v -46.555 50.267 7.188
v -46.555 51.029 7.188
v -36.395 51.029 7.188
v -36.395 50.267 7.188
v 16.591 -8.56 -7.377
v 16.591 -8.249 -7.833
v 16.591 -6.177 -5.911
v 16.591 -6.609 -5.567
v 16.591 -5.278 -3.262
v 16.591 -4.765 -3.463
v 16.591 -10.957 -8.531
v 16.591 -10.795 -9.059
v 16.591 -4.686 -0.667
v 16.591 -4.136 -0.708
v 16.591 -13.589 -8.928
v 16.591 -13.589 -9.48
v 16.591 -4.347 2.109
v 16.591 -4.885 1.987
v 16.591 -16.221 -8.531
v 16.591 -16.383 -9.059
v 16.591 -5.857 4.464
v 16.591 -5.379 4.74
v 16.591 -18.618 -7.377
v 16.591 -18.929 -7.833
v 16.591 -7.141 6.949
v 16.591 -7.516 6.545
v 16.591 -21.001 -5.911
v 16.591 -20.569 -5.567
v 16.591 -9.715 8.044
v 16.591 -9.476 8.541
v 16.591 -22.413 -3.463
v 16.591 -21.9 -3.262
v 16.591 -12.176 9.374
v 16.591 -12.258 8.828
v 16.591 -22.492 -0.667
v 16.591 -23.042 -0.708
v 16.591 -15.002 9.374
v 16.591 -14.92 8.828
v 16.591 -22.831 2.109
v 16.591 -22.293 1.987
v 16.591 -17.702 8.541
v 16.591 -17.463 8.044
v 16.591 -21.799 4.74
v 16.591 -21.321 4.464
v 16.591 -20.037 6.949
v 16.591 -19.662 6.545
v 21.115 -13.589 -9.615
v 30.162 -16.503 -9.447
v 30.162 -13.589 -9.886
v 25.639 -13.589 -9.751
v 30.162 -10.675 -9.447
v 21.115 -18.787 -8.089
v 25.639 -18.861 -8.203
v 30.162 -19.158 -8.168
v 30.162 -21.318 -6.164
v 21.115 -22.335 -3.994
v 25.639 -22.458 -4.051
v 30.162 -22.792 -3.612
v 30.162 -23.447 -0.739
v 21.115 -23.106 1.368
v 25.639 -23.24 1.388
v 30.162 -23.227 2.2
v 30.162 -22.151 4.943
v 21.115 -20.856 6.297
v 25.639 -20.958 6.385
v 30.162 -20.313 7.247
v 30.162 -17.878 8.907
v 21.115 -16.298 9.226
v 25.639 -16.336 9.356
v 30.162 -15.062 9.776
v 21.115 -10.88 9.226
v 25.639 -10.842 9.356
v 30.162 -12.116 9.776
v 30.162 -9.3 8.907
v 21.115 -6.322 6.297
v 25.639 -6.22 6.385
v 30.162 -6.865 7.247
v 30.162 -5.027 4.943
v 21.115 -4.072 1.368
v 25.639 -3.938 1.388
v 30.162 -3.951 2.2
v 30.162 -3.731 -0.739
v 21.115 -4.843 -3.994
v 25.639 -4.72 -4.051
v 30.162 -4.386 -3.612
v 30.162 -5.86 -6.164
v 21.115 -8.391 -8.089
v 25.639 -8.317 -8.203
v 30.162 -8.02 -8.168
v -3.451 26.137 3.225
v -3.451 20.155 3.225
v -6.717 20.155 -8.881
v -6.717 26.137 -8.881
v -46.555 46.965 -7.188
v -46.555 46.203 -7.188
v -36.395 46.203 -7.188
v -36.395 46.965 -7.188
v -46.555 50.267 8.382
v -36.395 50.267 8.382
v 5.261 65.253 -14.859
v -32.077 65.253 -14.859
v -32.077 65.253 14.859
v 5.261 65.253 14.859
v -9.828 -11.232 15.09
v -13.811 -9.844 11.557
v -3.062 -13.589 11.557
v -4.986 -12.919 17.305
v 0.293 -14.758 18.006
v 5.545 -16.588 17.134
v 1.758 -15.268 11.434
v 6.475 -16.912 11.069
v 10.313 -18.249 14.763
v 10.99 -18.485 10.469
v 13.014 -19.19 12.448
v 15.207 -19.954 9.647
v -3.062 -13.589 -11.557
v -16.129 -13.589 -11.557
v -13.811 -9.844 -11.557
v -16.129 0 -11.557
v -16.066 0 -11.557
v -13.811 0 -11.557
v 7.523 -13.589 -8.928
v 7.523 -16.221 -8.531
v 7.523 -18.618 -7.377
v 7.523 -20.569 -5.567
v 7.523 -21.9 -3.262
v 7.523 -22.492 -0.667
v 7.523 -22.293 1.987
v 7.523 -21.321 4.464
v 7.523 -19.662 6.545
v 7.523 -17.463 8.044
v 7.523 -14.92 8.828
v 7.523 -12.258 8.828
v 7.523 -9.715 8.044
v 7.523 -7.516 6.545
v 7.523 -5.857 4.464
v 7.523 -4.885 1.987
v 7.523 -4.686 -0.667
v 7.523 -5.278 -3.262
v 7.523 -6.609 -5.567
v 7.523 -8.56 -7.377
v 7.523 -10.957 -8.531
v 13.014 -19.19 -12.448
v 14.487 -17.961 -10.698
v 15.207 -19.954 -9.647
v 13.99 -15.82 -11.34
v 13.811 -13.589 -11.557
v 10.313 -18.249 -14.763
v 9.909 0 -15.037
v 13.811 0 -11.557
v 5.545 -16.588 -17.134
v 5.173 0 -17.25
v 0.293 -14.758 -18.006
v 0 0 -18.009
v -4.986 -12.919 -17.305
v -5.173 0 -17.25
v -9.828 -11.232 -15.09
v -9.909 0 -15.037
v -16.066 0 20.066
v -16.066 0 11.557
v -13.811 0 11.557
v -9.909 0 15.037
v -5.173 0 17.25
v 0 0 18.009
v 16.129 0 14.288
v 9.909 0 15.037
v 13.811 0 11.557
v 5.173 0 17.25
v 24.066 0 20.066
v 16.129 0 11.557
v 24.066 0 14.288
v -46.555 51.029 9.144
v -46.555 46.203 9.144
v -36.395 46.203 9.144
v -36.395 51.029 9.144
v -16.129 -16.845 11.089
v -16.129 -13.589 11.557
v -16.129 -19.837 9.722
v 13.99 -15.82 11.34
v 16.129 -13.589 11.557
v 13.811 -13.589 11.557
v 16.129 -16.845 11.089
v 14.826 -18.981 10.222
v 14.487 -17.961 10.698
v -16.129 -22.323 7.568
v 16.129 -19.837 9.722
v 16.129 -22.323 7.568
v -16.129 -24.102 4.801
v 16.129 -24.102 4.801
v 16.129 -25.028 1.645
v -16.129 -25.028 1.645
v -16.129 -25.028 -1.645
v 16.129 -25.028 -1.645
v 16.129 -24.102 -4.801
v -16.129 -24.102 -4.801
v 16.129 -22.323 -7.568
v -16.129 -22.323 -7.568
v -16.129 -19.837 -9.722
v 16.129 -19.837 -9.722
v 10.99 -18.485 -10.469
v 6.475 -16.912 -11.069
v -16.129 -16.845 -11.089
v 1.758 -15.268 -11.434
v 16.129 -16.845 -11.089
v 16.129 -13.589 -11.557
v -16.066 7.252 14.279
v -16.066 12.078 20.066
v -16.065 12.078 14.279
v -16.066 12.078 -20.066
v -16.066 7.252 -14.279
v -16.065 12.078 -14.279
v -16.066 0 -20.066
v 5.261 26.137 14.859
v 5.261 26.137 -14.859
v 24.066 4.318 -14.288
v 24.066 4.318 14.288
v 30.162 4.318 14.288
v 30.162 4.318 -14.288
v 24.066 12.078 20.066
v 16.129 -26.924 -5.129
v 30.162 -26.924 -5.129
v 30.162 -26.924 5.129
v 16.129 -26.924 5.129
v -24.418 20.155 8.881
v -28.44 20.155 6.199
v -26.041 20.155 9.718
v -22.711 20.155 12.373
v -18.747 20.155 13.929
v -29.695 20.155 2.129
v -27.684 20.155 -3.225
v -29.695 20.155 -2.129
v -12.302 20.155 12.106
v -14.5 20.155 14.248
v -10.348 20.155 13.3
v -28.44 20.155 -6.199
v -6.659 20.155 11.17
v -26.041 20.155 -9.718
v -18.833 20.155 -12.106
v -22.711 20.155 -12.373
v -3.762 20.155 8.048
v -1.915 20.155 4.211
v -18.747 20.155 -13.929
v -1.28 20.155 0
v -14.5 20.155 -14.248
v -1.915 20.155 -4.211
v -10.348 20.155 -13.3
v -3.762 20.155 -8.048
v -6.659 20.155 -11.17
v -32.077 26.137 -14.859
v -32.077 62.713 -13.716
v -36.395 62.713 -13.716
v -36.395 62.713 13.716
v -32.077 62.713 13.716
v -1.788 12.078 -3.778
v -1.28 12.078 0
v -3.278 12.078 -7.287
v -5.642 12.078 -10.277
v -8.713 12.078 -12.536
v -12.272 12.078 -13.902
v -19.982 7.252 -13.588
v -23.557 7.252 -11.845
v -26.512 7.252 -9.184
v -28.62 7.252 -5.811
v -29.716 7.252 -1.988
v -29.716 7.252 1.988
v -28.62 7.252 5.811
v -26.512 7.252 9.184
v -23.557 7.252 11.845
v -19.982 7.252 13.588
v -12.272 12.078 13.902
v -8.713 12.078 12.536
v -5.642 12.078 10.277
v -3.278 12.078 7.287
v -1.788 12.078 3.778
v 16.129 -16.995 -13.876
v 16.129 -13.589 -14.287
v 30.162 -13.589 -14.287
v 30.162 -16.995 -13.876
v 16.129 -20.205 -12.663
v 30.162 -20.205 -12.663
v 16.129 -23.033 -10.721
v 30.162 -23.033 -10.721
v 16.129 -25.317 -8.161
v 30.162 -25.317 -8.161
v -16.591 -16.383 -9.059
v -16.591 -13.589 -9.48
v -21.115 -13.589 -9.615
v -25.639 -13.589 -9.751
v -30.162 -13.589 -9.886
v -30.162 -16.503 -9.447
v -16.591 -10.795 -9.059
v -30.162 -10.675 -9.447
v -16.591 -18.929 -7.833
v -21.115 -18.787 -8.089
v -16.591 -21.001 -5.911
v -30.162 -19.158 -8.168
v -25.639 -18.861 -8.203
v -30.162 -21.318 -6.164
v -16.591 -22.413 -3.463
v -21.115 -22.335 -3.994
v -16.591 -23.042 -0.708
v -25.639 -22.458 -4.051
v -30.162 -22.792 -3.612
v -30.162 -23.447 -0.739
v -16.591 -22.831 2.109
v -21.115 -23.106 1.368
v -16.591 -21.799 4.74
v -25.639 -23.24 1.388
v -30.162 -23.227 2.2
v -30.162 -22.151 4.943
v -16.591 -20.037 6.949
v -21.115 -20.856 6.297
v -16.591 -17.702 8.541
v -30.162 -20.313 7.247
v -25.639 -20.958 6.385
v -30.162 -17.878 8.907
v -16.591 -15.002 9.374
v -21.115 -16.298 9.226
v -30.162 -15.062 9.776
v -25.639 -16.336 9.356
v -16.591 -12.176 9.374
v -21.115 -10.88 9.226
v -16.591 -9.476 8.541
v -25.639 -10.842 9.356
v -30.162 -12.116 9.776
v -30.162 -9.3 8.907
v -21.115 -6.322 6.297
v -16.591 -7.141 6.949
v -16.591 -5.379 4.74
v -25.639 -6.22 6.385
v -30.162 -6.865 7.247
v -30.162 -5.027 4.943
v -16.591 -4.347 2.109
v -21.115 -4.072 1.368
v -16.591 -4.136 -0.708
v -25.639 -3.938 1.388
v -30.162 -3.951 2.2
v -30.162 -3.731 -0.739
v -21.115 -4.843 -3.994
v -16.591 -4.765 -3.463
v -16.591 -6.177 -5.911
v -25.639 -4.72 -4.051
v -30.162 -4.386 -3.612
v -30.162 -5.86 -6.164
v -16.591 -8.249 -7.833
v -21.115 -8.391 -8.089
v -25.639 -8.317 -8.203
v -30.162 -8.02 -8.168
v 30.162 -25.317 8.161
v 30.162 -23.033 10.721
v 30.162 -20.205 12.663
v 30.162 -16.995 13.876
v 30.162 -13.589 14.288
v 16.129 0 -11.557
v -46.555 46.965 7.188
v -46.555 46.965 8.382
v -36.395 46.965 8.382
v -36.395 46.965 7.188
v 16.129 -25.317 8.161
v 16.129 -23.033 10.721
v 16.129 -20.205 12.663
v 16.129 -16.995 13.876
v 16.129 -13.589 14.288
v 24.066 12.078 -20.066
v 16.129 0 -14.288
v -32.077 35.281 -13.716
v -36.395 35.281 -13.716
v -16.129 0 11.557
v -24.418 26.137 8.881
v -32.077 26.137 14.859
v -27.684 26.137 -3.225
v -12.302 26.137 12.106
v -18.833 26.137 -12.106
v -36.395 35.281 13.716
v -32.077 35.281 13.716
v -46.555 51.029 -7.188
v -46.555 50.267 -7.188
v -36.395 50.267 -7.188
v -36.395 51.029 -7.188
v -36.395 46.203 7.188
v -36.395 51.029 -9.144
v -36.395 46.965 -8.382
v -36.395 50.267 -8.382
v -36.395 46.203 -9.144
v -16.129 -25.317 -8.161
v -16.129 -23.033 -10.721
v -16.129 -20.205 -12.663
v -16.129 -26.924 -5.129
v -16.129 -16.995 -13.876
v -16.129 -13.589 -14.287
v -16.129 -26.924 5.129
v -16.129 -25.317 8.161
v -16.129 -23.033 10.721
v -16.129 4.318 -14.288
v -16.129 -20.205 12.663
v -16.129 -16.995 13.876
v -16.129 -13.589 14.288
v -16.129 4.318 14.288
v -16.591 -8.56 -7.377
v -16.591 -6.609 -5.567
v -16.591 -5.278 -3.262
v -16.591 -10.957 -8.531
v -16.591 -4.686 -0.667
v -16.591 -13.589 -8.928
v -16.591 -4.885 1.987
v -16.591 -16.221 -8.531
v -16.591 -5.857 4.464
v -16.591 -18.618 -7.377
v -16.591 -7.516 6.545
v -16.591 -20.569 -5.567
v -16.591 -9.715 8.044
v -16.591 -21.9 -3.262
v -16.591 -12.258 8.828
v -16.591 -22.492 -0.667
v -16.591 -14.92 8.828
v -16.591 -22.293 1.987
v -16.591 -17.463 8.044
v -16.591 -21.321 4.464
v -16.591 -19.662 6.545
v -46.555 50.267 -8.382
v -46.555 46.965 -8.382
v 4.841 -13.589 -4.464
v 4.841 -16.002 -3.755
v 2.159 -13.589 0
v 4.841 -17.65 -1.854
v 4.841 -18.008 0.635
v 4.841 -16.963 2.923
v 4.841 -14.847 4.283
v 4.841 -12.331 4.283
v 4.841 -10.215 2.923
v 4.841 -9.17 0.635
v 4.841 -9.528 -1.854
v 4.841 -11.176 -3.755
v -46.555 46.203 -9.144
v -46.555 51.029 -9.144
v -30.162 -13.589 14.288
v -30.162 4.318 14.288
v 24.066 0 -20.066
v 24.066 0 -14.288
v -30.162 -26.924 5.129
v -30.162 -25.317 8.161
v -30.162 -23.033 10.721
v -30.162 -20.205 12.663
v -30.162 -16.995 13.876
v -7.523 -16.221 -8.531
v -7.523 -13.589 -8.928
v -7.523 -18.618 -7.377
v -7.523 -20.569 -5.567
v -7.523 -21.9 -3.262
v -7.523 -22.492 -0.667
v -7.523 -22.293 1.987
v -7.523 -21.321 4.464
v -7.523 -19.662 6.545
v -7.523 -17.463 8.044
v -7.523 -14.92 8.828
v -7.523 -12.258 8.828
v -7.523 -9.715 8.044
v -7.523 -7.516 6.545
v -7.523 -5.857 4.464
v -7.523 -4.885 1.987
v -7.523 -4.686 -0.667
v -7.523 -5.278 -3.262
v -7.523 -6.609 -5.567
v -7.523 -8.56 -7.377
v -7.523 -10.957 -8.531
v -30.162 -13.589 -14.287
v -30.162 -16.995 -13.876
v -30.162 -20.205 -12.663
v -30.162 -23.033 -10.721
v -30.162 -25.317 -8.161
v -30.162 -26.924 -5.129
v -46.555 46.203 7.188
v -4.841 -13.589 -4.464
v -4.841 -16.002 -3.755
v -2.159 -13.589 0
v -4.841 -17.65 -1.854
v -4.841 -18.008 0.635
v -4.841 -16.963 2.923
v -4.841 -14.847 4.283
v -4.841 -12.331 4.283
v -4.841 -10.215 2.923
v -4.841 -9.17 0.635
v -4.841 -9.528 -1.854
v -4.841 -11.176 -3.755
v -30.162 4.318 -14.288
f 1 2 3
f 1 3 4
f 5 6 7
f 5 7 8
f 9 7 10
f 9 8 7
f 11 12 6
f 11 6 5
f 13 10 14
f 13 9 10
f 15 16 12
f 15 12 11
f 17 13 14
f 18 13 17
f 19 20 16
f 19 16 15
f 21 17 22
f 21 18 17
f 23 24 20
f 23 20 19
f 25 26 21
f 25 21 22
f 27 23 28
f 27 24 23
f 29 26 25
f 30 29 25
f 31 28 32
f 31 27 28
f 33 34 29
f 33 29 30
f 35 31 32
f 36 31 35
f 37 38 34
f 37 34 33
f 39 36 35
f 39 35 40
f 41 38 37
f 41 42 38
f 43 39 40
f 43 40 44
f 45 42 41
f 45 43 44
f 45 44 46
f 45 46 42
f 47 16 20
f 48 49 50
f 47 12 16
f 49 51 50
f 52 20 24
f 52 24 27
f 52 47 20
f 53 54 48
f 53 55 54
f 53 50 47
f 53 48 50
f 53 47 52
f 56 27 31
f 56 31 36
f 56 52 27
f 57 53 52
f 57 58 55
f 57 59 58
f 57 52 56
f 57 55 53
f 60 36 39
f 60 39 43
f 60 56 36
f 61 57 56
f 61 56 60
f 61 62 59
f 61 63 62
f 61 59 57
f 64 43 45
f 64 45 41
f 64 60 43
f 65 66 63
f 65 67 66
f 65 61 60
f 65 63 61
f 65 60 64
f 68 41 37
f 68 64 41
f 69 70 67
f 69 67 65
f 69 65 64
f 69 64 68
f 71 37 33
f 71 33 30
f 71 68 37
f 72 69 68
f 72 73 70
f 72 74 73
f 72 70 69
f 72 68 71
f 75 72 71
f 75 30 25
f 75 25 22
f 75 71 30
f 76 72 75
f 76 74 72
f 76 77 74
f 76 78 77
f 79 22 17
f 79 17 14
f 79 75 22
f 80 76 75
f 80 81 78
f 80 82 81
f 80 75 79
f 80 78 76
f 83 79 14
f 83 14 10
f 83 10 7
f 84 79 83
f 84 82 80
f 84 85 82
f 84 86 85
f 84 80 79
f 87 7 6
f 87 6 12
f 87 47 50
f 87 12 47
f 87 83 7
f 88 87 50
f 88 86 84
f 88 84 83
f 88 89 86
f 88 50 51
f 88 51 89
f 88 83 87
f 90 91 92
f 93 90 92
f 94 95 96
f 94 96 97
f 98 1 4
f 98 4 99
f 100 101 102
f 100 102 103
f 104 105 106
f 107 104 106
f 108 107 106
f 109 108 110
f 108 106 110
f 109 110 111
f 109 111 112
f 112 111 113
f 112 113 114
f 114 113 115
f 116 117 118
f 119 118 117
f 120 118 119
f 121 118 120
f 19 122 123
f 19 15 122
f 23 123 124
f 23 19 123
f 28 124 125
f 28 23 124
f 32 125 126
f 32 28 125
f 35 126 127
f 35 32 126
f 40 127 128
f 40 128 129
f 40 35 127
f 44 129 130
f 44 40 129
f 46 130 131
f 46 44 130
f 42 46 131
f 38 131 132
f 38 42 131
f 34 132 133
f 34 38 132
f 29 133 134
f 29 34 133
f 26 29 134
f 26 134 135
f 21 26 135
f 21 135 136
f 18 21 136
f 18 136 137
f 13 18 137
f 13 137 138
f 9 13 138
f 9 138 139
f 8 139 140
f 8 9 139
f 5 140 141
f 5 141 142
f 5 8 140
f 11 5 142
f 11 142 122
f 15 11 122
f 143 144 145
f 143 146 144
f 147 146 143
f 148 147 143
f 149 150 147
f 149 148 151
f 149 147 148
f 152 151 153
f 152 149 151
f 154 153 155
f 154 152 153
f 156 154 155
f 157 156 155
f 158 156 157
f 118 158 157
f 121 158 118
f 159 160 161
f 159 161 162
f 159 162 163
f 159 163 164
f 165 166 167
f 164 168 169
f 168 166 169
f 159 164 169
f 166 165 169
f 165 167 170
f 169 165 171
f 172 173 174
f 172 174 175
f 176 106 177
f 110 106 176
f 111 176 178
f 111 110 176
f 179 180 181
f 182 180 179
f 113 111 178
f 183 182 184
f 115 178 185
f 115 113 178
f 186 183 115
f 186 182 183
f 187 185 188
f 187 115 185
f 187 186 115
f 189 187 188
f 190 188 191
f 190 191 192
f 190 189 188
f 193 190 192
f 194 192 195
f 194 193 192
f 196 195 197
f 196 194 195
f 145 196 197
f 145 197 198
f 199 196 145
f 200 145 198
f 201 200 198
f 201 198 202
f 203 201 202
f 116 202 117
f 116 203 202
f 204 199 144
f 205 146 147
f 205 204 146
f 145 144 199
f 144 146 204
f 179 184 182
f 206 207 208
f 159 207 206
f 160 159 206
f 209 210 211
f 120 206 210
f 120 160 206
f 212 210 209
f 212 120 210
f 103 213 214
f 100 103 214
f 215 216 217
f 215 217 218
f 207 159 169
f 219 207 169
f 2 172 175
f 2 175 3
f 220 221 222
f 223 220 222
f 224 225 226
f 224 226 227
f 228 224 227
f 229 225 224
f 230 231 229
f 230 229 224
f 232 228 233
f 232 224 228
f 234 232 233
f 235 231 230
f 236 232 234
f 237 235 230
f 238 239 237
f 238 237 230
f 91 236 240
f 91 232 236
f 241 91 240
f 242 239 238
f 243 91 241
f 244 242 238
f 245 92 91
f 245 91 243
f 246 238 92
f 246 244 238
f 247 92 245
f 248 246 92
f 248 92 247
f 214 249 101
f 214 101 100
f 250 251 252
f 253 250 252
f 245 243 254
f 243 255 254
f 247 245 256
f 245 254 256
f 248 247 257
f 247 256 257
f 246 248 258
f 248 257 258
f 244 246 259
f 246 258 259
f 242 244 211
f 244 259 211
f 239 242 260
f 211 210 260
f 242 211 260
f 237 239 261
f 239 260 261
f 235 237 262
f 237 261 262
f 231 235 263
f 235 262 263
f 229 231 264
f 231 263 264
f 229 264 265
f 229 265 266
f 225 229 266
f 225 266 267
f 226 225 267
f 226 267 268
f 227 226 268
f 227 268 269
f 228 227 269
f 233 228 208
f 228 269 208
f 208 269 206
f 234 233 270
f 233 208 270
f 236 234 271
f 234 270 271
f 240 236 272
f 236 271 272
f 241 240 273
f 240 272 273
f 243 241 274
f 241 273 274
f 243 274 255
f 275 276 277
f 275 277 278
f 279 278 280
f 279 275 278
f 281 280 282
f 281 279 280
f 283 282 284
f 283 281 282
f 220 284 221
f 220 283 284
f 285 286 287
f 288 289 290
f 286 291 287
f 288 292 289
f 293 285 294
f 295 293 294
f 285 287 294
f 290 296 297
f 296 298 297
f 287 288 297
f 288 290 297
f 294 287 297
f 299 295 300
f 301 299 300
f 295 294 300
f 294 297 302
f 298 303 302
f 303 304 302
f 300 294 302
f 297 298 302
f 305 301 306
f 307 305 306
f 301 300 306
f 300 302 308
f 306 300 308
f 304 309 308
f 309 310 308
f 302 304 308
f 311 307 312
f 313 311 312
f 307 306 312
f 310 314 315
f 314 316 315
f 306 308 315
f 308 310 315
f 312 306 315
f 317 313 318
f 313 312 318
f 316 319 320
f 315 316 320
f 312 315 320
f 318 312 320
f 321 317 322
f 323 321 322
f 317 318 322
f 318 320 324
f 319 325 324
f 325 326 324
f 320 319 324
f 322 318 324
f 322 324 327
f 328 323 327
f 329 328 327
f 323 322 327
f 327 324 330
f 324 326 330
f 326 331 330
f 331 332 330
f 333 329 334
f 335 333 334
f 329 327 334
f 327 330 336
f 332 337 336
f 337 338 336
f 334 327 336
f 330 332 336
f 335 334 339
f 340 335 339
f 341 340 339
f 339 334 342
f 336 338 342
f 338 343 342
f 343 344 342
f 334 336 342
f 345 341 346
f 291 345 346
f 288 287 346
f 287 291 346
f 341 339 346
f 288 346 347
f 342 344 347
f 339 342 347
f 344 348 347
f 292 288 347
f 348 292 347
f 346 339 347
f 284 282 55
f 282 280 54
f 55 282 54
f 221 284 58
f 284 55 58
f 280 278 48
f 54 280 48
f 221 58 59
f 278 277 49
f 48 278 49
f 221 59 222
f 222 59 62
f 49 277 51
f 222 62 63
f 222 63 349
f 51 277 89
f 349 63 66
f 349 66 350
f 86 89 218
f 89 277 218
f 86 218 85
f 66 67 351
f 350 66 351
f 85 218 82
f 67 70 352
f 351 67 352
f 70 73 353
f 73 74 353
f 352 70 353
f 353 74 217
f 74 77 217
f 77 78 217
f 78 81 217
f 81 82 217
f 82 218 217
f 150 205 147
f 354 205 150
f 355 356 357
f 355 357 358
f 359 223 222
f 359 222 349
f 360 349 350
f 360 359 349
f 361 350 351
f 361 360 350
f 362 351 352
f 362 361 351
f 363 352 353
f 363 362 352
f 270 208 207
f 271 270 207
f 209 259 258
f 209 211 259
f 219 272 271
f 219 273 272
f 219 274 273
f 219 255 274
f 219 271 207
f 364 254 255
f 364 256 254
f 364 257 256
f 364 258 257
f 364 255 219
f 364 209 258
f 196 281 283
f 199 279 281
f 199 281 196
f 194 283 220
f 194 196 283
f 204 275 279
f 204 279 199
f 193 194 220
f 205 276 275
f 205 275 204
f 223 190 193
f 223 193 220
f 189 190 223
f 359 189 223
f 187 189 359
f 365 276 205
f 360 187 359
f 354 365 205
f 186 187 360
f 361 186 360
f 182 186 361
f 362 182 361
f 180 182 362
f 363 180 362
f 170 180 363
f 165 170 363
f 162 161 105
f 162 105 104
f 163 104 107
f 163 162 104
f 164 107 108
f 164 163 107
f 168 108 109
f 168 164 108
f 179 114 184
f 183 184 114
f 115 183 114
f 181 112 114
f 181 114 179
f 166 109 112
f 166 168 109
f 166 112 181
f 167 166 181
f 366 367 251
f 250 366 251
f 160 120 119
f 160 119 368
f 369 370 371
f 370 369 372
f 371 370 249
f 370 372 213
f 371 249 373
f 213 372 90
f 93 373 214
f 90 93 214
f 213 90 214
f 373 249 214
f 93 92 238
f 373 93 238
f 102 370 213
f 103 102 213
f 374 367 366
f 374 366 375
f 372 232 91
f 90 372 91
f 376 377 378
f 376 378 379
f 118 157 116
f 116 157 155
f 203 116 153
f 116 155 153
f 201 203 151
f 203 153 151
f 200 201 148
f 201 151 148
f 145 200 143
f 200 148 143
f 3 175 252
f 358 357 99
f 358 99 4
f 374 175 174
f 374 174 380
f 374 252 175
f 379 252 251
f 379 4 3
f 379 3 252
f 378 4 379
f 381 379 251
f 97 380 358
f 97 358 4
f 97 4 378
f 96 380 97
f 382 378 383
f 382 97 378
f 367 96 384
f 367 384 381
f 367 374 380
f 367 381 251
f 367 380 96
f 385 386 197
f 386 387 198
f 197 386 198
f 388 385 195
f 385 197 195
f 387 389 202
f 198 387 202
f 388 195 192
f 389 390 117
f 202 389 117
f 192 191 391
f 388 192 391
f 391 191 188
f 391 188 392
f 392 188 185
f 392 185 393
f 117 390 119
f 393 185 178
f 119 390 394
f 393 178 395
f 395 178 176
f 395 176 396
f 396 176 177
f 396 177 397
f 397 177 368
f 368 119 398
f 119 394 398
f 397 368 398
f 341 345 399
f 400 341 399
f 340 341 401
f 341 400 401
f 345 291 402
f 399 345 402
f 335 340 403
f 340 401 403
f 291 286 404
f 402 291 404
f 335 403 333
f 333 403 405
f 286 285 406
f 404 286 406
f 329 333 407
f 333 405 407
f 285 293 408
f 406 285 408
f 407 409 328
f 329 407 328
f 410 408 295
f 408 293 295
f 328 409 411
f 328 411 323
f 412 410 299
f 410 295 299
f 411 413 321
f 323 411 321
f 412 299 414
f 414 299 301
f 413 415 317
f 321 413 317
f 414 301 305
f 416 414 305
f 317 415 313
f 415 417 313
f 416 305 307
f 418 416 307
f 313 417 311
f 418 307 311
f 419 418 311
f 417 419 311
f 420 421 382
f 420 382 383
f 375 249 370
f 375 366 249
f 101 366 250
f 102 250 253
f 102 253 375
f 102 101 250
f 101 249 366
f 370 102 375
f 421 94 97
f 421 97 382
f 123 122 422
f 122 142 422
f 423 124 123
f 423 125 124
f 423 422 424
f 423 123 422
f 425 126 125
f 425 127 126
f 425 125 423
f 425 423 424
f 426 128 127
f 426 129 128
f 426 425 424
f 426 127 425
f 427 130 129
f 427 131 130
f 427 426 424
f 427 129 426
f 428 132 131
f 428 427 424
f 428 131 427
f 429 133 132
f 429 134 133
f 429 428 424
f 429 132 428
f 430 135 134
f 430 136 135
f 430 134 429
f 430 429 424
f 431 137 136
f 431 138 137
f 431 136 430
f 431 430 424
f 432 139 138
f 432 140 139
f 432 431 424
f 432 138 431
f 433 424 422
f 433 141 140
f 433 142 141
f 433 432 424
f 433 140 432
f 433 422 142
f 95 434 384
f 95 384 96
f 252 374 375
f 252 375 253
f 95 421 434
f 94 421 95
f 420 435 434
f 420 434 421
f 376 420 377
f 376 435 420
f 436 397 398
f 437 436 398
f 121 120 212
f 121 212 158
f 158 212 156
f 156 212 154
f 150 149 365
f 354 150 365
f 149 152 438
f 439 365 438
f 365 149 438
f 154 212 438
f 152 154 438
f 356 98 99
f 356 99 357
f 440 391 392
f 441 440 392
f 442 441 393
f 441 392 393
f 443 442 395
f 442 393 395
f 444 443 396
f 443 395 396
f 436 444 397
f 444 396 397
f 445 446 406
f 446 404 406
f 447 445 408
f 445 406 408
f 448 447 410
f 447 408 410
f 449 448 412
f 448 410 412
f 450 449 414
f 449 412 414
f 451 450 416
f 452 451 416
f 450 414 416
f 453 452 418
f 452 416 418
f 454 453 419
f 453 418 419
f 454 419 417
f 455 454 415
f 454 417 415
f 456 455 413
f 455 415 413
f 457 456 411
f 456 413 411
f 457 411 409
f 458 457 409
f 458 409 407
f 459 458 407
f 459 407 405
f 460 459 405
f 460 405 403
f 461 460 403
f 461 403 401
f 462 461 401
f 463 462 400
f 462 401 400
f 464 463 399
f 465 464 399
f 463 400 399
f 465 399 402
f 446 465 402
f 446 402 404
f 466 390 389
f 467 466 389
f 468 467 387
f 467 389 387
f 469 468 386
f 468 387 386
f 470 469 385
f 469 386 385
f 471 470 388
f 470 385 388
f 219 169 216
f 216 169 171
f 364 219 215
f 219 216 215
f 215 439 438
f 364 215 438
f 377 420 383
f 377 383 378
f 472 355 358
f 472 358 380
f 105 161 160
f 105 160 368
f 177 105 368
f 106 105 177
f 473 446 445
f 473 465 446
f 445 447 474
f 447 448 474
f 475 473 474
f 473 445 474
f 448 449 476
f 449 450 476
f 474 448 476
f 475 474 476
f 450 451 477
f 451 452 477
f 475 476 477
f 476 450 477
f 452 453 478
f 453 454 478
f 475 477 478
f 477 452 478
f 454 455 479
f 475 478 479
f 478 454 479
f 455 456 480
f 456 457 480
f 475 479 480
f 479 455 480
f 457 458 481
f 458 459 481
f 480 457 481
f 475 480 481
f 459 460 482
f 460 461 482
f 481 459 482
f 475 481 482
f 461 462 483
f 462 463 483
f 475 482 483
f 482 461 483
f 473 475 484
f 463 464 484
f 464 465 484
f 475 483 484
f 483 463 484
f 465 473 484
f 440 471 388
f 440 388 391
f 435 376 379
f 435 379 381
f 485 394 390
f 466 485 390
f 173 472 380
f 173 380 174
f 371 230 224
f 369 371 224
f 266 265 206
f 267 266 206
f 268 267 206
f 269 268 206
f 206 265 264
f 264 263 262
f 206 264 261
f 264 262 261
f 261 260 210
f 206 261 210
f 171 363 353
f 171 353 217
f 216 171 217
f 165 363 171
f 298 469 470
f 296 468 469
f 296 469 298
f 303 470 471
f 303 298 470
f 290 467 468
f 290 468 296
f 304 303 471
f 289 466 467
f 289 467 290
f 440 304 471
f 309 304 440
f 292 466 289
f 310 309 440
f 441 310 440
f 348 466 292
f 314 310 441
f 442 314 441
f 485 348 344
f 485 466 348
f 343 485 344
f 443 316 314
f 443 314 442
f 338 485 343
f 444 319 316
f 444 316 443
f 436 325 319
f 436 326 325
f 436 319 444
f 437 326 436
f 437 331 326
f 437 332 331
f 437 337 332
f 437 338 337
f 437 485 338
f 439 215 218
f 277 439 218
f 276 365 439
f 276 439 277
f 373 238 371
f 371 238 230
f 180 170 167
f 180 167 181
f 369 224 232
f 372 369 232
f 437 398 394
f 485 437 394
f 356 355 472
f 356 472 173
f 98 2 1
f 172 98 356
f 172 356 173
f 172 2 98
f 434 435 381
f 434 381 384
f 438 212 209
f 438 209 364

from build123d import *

# Parameters (mm, degrees)
SKETCH1_R                = 18.0086
BOSS_EXTRUDE1_DEPTH      = 20.9296
CUT_EXTRUDE1_DEPTH       = 19.0086
CUT_EXTRUDE1_DEPTH_BACK  = 19.0086
BOSS_EXTRUDE2_DEPTH      = 16.129
BOSS_EXTRUDE3_DEPTH      = 14.0335
SKETCH6_W                = 40.132
SKETCH6_H                = 40.132
BOSS_EXTRUDE4_DEPTH      = 12.0777
SKETCH7_R                = 14.2875
BOSS_EXTRUDE5_DEPTH      = 8.0772
BOSS_EXTRUDE5_DEPTH_BACK = 4.826
BOSS_EXTRUDE6_DEPTH      = 5.9817
SKETCH11_W               = 41.656
SKETCH11_H               = 29.718
BOSS_EXTRUDE7_DEPTH      = 39.116
SKETCH12_W               = 29.718
SKETCH12_H               = 39.116
SKETCH12_W_2             = 27.432
SKETCH12_H_2             = 27.432
CUT_EXTRUDE2_DEPTH       = 4.318
BOSS_EXTRUDE8_DEPTH      = 10.16


with BuildPart() as part:
    # Sketch1 → Boss-Extrude1 (new body)
    with BuildSketch(Plane(origin=(0, 0, 0), x_dir=(1, 0, 0), z_dir=(0, 1, 0))):
        Circle(SKETCH1_R)
    extrude(amount=-BOSS_EXTRUDE1_DEPTH)

    # Sketch2 → Cut-Extrude1 (cut, two sides)
    with BuildSketch(Plane.XY) as cut_extrude1_sk:
        Polygon((-18.0086, -8.382), (18.0086, -20.9296), (-18.0086, -20.9296), align=None)
    extrude(amount=CUT_EXTRUDE1_DEPTH, mode=Mode.SUBTRACT)
    extrude(cut_extrude1_sk.sketch, amount=-CUT_EXTRUDE1_DEPTH_BACK, mode=Mode.SUBTRACT)

    # Sketch3 → Boss-Extrude2 (add, symmetric)
    with BuildSketch(Plane(origin=(0, 0, 0), x_dir=(0, 0, -1), z_dir=(1, 0, 0))):
        with BuildLine():
            Line((-11.557, 0), (-11.557, -13.589))
            ThreePointArc((-11.557, -13.589), (0, -25.146), (11.557, -13.589))
            Line((11.557, -13.589), (11.557, 0))
            Line((11.557, 0), (-11.557, 0))
        make_face()
    extrude(amount=BOSS_EXTRUDE2_DEPTH, both=True)

    # Sketch5 → Boss-Extrude3 (add)
    with BuildSketch(Plane.ZY.offset(16.129)):
        with BuildLine():
            Line((-14.2875, 4.318), (-14.2875, -13.589))
            ThreePointArc((-14.2875, -13.589), (-11.777489603, -21.677472965), (-5.129369479, -26.924))
            Line((-5.129369479, -26.924), (5.129369479, -26.924))
            ThreePointArc((5.129369479, -26.924), (11.777489603, -21.677472965), (14.2875, -13.589))
            Line((14.2875, -13.589), (14.2875, 4.318))
            Line((14.2875, 4.318), (-14.2875, 4.318))
        make_face()
    boss_extrude3 = extrude(amount=BOSS_EXTRUDE3_DEPTH)

    # Mirror1: Boss-Extrude3 across plane
    add(boss_extrude3.mirror(Plane(origin=(0, 0, 0), x_dir=(0, 0, 1), z_dir=(1, 0, 0))))

    # Sketch6 → Boss-Extrude4 (add)
    with BuildSketch(Plane(origin=(0, 0, 0), x_dir=(1, 0, 0), z_dir=(0, 1, 0))):
        with Locations((4.0005, 0)):
            Rectangle(SKETCH6_W, SKETCH6_H)
    extrude(amount=BOSS_EXTRUDE4_DEPTH)

    # Sketch7 → Boss-Extrude5 (add, two sides)
    with BuildSketch(Plane(origin=(0, 12.0777, 0), x_dir=(1, 0, 0), z_dir=(0, 1, 0))) as boss_extrude5_sk:
        with Locations((-15.56738583, 0)):
            Circle(SKETCH7_R)
    extrude(amount=BOSS_EXTRUDE5_DEPTH)
    extrude(boss_extrude5_sk.sketch, amount=-BOSS_EXTRUDE5_DEPTH_BACK)

    # Sketch8 → 1/2 NPT Tapped Hole1 (revolve, cut)
    with BuildSketch(Plane(origin=(30.1625, -13.589, 0), x_dir=(0, 0, -1), z_dir=(0, 1, 0))):
        Polygon((0, 0), (0, 28.003563693), (8.9281, 22.63902), (8.9281, 13.57122), (9.479720499, 13.57122), (9.886061, 0), align=None)
    f_1_2_npt_tapped_hole1 = revolve(axis=Axis((36.5125, -13.589, 0), (-1, 0, 0)), mode=Mode.SUBTRACT)

    # Mirror2: 1/2 NPT Tapped Hole1 across plane
    add(f_1_2_npt_tapped_hole1.mirror(Plane(origin=(0, 0, 0), x_dir=(0, 0, 1), z_dir=(1, 0, 0))), mode=Mode.SUBTRACT)

    # Sketch10 → Boss-Extrude6 (add)
    with BuildSketch(Plane(origin=(0, 20.1549, 0), x_dir=(1, 0, 0), z_dir=(0, 1, 0))):
        Polygon((-6.716522972, 8.880967834), (-18.833098156, 12.105555998), (-27.683961014, 3.224588164), (-24.418248689, -8.880967834), (-12.301673505, -12.105555998), (-3.450810647, -3.224588164), align=None)
    extrude(amount=BOSS_EXTRUDE6_DEPTH)

    # Sketch11 → Boss-Extrude7 (add)
    with BuildSketch(Plane(origin=(0, 26.1366, 0), x_dir=(1, 0, 0), z_dir=(0, 1, 0))):
        with Locations((-15.56738583, 0)):
            Rectangle(SKETCH11_W, SKETCH11_H)
    extrude(amount=BOSS_EXTRUDE7_DEPTH)

    # Sketch12 → Cut-Extrude2 (cut)
    with BuildSketch(Plane.ZY.offset(36.39538583)):
        with Locations((0, 45.6946)):
            Rectangle(SKETCH12_W, SKETCH12_H)
        with Locations((0, 48.9966)):
            Rectangle(SKETCH12_W_2, SKETCH12_H_2, mode=Mode.SUBTRACT)
    extrude(amount=-CUT_EXTRUDE2_DEPTH, mode=Mode.SUBTRACT)

    # Sketch13 → Boss-Extrude8 (add)
    with BuildSketch(Plane.ZY.offset(36.39538583)):
        Polygon((-7.1882, 51.0286), (-9.144, 51.0286), (-9.144, 46.2026), (-7.1882, 46.2026), (-7.1882, 46.9646), (-8.382, 46.9646), (-8.382, 50.2666), (-7.1882, 50.2666), align=None)
        Polygon((7.1882, 46.9646), (7.1882, 46.2026), (9.144, 46.2026), (9.144, 51.0286), (7.1882, 51.0286), (7.1882, 50.2666), (8.382, 50.2666), (8.382, 46.9646), align=None)
    extrude(amount=BOSS_EXTRUDE8_DEPTH)


solid = part.part
